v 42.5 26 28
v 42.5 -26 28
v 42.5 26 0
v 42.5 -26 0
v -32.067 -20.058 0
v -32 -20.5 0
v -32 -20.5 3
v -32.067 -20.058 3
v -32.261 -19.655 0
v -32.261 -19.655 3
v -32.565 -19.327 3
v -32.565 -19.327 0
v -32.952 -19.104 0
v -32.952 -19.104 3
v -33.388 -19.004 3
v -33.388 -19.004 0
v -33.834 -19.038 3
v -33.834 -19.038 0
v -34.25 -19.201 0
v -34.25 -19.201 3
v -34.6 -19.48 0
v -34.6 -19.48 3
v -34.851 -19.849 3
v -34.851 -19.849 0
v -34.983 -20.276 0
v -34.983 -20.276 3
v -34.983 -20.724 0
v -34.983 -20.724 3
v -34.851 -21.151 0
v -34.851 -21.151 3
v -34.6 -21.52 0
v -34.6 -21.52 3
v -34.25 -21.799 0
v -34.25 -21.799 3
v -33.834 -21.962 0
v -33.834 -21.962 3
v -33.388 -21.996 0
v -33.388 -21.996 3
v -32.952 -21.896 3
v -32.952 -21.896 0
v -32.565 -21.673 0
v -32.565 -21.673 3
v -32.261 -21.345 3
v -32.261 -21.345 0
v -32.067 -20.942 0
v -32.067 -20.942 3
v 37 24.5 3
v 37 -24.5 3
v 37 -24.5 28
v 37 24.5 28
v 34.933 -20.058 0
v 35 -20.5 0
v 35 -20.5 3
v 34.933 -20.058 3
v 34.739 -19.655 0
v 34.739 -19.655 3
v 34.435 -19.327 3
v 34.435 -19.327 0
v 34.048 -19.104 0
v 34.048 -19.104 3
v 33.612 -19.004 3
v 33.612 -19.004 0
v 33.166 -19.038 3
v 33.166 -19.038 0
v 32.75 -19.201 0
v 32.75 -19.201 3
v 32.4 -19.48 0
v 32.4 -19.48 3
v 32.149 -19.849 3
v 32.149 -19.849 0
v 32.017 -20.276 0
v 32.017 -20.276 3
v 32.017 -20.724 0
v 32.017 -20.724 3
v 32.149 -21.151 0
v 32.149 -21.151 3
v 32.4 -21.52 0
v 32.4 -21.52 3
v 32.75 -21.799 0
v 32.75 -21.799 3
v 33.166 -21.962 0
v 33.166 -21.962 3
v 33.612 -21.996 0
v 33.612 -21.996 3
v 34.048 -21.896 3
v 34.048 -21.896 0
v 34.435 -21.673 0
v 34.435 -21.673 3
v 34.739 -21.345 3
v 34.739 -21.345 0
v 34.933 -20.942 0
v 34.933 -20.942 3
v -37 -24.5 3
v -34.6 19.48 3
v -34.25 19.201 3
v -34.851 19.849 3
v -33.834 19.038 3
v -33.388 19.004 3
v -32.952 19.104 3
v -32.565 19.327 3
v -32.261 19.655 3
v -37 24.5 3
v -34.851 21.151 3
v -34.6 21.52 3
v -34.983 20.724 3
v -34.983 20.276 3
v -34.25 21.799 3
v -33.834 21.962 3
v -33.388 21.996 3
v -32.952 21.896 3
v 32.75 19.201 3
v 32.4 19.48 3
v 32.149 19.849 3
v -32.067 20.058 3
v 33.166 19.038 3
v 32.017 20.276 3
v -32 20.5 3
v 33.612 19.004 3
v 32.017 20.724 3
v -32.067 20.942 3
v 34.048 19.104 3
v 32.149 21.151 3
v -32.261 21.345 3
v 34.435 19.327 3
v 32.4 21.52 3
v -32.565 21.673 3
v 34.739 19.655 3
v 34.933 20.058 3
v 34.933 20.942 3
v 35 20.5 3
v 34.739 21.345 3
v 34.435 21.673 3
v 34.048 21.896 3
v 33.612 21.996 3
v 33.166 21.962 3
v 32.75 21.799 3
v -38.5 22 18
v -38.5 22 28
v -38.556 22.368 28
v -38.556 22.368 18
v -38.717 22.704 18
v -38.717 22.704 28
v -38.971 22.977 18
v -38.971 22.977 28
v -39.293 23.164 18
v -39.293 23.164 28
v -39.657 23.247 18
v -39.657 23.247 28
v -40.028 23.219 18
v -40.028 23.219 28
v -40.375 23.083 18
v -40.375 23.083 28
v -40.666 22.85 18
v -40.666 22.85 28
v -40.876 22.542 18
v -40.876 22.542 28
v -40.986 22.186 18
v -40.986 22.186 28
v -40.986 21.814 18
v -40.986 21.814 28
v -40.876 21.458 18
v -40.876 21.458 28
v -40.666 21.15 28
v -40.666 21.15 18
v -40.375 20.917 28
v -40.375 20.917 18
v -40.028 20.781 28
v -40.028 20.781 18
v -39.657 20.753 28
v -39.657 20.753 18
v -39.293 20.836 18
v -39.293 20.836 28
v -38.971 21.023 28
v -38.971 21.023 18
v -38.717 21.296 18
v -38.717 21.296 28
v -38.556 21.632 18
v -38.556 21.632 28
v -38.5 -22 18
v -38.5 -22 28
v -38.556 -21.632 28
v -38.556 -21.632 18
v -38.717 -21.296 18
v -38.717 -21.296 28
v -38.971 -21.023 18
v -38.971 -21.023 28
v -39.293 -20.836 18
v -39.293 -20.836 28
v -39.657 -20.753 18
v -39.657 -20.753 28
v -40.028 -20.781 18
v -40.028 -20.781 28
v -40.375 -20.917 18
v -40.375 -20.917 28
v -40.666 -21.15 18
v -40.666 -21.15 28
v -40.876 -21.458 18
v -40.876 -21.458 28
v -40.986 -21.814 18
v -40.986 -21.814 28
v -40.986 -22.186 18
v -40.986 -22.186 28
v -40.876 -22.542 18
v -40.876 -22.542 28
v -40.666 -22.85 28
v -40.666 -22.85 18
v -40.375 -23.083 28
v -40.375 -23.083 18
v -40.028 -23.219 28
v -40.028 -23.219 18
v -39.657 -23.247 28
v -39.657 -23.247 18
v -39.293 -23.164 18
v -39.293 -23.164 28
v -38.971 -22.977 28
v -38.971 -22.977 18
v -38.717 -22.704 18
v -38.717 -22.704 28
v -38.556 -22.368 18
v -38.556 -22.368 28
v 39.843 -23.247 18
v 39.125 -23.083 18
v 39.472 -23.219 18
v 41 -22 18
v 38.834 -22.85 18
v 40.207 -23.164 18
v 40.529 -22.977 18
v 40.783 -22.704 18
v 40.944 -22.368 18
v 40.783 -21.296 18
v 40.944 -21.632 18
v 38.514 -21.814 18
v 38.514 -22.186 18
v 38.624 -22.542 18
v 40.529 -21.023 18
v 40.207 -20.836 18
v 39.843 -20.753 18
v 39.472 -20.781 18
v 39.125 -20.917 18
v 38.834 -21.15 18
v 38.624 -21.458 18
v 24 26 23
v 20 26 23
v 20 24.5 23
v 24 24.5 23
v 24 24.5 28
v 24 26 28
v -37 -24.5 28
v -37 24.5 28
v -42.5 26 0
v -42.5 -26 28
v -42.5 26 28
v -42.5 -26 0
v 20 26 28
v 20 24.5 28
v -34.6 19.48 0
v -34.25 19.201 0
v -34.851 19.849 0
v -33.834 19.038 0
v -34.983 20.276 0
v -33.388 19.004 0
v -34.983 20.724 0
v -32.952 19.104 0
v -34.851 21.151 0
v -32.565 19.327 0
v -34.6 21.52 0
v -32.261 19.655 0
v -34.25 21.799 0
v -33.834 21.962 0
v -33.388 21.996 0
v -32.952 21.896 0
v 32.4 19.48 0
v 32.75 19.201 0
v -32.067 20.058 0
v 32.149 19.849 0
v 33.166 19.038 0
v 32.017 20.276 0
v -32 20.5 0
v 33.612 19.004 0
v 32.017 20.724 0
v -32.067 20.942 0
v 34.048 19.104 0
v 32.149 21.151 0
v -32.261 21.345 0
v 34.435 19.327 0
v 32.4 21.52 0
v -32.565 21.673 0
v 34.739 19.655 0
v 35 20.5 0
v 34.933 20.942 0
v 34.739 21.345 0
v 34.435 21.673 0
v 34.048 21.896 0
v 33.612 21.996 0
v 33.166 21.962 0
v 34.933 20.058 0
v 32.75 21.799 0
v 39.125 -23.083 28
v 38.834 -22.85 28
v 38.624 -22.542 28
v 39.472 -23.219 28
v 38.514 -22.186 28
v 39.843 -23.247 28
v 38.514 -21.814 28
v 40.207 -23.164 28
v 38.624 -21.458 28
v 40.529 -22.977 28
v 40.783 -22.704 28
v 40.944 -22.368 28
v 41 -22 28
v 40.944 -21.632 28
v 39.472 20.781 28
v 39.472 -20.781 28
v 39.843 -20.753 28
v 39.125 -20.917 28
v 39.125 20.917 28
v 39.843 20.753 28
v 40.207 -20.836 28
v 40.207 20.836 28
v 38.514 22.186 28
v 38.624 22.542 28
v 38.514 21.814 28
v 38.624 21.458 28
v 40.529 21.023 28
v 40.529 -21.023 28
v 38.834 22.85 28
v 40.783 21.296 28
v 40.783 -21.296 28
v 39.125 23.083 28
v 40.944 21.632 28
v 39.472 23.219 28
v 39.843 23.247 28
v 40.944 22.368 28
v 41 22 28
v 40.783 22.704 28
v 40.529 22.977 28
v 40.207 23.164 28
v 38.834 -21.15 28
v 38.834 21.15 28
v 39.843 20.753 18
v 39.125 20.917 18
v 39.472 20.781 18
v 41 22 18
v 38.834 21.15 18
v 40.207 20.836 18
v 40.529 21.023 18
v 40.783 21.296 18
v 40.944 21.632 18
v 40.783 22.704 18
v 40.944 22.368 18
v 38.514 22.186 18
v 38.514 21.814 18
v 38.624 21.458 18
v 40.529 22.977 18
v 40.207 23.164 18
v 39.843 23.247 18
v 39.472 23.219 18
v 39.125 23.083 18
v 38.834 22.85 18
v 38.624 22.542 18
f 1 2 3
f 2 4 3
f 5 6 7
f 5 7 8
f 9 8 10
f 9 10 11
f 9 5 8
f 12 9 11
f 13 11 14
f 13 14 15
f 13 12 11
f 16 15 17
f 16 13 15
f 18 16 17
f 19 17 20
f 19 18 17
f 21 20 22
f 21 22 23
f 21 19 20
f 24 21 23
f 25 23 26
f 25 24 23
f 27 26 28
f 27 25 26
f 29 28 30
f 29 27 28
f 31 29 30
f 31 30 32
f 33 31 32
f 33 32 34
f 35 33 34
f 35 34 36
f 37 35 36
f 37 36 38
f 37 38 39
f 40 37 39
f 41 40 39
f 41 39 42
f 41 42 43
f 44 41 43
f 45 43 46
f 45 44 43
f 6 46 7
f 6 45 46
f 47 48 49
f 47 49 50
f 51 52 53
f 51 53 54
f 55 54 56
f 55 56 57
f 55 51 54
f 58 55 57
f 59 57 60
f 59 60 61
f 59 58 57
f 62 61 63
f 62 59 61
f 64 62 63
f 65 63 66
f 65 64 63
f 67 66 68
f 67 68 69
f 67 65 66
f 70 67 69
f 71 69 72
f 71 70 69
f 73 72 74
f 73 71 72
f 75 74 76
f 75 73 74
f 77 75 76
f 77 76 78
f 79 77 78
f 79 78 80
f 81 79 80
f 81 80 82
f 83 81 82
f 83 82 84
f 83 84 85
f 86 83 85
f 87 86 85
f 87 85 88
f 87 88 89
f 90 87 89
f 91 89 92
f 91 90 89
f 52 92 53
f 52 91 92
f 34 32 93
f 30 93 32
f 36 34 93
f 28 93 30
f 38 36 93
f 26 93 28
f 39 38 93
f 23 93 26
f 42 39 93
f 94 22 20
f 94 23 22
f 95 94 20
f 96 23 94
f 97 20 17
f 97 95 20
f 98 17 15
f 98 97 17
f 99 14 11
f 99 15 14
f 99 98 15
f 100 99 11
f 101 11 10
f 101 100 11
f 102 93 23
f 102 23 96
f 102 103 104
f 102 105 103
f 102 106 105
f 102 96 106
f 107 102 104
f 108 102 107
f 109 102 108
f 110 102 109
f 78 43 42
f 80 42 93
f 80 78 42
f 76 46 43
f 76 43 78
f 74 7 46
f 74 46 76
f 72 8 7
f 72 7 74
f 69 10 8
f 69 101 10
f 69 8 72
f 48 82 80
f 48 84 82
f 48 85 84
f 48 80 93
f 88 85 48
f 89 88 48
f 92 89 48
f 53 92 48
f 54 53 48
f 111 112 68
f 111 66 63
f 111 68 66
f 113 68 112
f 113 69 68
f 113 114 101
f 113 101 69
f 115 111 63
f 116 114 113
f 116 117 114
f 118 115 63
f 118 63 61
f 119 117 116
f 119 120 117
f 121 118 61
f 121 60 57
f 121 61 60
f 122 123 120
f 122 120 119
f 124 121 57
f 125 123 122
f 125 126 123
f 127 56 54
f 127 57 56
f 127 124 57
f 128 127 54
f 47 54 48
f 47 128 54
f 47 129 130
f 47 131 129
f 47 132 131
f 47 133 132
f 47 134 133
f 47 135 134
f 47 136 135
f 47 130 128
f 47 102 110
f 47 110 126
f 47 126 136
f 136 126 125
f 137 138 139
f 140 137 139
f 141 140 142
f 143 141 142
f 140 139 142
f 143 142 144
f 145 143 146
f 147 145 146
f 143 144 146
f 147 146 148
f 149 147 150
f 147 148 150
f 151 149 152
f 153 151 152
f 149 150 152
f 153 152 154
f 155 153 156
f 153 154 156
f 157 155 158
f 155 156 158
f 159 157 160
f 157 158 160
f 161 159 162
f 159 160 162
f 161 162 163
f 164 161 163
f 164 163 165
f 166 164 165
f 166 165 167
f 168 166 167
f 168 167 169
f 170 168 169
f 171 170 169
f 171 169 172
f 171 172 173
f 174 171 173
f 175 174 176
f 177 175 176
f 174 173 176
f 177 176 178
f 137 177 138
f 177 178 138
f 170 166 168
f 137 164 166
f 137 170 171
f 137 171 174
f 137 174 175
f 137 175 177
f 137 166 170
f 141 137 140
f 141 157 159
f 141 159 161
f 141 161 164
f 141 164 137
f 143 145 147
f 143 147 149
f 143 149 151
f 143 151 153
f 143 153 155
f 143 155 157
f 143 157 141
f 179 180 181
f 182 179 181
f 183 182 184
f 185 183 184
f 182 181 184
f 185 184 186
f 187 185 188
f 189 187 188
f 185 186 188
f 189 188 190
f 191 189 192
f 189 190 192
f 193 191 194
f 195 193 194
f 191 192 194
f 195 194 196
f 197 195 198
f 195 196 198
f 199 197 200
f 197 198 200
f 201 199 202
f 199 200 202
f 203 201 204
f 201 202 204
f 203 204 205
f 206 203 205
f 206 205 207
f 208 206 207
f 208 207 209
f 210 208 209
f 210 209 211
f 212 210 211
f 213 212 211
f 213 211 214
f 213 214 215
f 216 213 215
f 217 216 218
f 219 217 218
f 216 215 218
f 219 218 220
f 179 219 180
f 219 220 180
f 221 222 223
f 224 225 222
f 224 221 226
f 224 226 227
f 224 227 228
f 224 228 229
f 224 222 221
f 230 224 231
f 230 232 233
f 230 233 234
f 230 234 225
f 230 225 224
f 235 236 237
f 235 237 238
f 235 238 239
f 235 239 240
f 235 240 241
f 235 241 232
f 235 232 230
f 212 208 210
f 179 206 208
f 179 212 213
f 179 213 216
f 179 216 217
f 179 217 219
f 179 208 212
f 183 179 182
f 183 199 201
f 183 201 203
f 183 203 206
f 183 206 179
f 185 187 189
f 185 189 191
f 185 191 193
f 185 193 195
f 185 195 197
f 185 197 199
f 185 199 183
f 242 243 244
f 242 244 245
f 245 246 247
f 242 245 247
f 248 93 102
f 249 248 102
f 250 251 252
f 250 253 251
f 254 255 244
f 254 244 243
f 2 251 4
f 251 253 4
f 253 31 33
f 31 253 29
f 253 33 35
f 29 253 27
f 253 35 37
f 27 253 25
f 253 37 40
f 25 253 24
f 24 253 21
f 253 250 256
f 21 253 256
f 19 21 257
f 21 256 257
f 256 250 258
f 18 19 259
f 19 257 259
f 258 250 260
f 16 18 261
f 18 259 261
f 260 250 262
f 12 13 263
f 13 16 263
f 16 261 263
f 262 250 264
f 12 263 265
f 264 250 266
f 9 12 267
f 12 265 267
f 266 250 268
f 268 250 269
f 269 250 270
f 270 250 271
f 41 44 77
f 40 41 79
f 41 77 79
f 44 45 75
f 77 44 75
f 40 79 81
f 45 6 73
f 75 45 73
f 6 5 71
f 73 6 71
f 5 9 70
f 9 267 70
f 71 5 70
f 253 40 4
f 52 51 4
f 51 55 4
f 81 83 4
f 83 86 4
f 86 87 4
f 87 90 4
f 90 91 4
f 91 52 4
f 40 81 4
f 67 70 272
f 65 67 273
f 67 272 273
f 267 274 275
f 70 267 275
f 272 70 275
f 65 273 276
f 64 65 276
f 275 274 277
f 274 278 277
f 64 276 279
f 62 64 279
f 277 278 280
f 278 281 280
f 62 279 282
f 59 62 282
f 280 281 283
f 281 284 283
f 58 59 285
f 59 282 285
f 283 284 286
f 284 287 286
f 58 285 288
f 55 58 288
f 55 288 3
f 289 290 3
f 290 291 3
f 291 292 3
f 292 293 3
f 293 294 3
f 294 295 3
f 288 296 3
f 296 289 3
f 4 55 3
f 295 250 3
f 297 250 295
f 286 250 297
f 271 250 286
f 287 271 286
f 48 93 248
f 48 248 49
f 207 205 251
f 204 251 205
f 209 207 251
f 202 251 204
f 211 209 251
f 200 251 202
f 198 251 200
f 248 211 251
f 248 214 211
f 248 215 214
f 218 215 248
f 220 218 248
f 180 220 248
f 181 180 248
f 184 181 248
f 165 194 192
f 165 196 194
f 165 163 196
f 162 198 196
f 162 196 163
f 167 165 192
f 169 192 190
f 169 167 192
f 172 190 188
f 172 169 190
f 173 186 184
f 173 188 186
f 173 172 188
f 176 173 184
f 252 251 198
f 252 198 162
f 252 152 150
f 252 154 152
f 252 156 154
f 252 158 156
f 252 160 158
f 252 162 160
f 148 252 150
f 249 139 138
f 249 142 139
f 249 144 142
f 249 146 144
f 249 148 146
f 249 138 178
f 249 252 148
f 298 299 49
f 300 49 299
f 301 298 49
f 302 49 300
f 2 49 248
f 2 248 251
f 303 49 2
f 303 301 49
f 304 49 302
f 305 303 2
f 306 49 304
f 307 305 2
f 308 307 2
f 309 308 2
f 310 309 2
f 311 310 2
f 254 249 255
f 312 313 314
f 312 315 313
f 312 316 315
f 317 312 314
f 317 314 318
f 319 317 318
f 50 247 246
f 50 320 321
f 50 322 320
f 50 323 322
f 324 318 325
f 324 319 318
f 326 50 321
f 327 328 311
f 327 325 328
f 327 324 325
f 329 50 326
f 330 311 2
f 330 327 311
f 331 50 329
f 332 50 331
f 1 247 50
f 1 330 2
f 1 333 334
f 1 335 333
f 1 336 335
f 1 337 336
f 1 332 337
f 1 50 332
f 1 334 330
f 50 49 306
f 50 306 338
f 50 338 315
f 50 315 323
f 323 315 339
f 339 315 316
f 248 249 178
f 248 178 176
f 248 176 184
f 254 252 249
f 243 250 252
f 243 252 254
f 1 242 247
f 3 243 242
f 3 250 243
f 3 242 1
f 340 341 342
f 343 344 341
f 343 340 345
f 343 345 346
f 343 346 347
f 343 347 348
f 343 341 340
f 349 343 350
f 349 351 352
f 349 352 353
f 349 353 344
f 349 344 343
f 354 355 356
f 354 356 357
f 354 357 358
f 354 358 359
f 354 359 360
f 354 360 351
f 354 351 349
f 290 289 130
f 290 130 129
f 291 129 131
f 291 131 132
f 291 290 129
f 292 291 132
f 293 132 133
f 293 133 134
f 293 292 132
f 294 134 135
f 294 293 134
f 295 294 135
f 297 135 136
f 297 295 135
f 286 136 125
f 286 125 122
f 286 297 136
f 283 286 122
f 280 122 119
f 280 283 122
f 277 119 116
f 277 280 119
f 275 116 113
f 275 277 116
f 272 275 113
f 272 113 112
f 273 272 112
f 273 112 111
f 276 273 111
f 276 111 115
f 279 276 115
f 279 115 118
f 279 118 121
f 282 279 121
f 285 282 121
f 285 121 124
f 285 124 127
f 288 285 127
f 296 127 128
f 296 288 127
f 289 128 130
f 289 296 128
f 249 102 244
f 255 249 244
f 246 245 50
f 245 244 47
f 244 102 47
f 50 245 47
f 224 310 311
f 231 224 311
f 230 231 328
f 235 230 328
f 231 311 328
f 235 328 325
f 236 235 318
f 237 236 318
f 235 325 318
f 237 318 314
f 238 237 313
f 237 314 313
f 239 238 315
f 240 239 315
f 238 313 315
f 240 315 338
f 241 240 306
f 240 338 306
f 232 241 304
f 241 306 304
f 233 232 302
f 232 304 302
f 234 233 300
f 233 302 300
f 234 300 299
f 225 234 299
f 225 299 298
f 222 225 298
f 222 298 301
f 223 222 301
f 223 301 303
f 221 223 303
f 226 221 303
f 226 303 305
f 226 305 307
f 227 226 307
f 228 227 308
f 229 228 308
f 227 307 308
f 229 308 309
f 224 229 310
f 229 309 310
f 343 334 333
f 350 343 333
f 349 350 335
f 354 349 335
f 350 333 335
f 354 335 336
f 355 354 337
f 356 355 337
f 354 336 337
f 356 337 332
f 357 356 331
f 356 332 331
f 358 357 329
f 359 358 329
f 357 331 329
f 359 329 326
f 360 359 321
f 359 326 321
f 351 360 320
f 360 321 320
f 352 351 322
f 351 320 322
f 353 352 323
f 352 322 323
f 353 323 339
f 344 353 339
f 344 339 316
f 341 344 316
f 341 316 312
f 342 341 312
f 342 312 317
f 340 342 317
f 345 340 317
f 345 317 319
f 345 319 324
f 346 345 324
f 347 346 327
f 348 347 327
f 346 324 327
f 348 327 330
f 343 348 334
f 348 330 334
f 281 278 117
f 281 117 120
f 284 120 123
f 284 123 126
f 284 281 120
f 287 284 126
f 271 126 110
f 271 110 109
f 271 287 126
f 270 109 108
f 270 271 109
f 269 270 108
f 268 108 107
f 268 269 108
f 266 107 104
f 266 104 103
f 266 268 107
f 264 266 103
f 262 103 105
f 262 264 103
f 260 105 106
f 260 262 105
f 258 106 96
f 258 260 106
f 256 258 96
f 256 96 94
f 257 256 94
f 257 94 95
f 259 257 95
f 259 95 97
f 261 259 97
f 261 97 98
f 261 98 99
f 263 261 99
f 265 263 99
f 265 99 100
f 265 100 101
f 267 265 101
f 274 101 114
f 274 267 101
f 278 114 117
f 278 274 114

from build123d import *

# Parameters (mm, degrees)
F0_W     = 85
F0_H     = 52
F0_R     = 1.5
F1_DEPTH = 3
F2_W     = 85
F2_H     = 52
F2_W_2   = 74
F2_H_2   = 49
F3_DEPTH = 25
F4_R     = 1.25
F5_DEPTH = 10
F6_W     = 4
F6_H     = 1.5
F7_DEPTH = 5


with BuildPart() as f1:
    # F0 (on Top) → F1 (new body)
    with BuildSketch(Plane.XY):
        Rectangle(F0_W, F0_H)
        with Locations((-33.5, -20.5)):
            Circle(F0_R, mode=Mode.SUBTRACT)
        with Locations((33.5, -20.5)):
            Circle(F0_R, mode=Mode.SUBTRACT)
        with Locations((-33.5, 20.5)):
            Circle(F0_R, mode=Mode.SUBTRACT)
        with Locations((33.5, 20.5)):
            Circle(F0_R, mode=Mode.SUBTRACT)
    extrude(amount=F1_DEPTH)

    # F2 (on face) → F3 (join)
    with BuildSketch(Plane.XY.offset(3)):
        Rectangle(F2_W, F2_H)
        Rectangle(F2_W_2, F2_H_2, mode=Mode.SUBTRACT)
    extrude(amount=F3_DEPTH)

    # F4 (on face) → F5 (cut)
    with BuildSketch(Plane.XY.offset(28)):
        with Locations((-39.75, 22)):
            Circle(F4_R)
        with Locations((-39.75, -22)):
            Circle(F4_R)
        with Locations((39.75, 22)):
            Circle(F4_R)
        with Locations((39.75, -22)):
            Circle(F4_R)
    extrude(amount=-F5_DEPTH, mode=Mode.SUBTRACT)

    # F6 (on face) → F7 (cut)
    with BuildSketch(Plane.XY.offset(28)):
        with Locations((22, 25.25)):
            Rectangle(F6_W, F6_H)
    extrude(amount=-F7_DEPTH, mode=Mode.SUBTRACT)


solid = f1.part
